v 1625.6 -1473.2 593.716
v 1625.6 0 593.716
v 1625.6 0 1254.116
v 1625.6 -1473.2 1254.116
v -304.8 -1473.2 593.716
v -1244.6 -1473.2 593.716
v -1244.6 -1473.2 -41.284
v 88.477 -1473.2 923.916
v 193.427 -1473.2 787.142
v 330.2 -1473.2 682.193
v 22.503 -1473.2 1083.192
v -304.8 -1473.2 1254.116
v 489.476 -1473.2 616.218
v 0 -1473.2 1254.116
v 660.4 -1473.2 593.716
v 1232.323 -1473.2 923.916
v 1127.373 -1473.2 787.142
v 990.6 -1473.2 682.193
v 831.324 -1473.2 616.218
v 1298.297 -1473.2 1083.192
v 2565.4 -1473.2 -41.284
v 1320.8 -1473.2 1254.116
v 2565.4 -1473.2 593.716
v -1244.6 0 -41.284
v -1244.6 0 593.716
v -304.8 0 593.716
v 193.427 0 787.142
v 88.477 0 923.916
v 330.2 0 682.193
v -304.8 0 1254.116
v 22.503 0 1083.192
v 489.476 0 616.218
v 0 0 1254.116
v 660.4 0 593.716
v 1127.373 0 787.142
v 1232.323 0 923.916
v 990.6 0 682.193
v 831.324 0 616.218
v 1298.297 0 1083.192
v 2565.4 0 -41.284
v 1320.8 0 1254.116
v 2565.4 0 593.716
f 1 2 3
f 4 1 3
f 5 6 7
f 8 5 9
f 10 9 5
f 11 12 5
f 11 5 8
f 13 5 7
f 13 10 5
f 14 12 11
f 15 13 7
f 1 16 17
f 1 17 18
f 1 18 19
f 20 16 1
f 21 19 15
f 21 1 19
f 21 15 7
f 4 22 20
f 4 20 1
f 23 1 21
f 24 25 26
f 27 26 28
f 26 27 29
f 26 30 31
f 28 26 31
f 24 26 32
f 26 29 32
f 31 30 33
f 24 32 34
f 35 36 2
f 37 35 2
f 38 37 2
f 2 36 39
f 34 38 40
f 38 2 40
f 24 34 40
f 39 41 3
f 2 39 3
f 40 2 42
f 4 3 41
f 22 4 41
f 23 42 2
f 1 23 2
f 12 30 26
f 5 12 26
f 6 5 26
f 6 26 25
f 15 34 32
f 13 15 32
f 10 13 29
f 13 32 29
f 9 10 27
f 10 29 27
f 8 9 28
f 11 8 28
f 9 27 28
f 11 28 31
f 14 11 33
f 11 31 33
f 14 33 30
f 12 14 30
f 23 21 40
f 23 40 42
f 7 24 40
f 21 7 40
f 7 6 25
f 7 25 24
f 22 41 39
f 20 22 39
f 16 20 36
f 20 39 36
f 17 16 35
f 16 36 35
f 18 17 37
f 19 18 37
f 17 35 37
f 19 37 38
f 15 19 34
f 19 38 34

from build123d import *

# Parameters (mm, degrees)
F1_DEPTH = 1473.2


with BuildPart() as f1:
    # F0 (on Front) → F1 (new body)
    with BuildSketch(Plane.XZ):
        Polygon((-304.8, 593.71577), (-1244.6, 593.71577), (-1244.6, -41.28423), (2565.4, -41.28423), (2565.4, 593.71577), (1625.6, 593.71577), (660.4, 593.71577), align=None)
        with BuildLine():
            ThreePointArc((1320.8, 1254.11577), (1127.373318, 787.142452), (660.4, 593.71577))
            Line((660.4, 593.71577), (1625.6, 593.71577))
            Line((1625.6, 593.71577), (1625.6, 1254.11577))
            Line((1625.6, 1254.11577), (1320.8, 1254.11577))
        make_face()
        with BuildLine():
            Line((-304.8, 1254.11577), (-304.8, 593.71577))
            Line((-304.8, 593.71577), (660.4, 593.71577))
            ThreePointArc((660.4, 593.71577), (193.426682, 787.142452), (0, 1254.11577))
            Line((0, 1254.11577), (-304.8, 1254.11577))
        make_face()
    extrude(amount=F1_DEPTH)


solid = f1.part
